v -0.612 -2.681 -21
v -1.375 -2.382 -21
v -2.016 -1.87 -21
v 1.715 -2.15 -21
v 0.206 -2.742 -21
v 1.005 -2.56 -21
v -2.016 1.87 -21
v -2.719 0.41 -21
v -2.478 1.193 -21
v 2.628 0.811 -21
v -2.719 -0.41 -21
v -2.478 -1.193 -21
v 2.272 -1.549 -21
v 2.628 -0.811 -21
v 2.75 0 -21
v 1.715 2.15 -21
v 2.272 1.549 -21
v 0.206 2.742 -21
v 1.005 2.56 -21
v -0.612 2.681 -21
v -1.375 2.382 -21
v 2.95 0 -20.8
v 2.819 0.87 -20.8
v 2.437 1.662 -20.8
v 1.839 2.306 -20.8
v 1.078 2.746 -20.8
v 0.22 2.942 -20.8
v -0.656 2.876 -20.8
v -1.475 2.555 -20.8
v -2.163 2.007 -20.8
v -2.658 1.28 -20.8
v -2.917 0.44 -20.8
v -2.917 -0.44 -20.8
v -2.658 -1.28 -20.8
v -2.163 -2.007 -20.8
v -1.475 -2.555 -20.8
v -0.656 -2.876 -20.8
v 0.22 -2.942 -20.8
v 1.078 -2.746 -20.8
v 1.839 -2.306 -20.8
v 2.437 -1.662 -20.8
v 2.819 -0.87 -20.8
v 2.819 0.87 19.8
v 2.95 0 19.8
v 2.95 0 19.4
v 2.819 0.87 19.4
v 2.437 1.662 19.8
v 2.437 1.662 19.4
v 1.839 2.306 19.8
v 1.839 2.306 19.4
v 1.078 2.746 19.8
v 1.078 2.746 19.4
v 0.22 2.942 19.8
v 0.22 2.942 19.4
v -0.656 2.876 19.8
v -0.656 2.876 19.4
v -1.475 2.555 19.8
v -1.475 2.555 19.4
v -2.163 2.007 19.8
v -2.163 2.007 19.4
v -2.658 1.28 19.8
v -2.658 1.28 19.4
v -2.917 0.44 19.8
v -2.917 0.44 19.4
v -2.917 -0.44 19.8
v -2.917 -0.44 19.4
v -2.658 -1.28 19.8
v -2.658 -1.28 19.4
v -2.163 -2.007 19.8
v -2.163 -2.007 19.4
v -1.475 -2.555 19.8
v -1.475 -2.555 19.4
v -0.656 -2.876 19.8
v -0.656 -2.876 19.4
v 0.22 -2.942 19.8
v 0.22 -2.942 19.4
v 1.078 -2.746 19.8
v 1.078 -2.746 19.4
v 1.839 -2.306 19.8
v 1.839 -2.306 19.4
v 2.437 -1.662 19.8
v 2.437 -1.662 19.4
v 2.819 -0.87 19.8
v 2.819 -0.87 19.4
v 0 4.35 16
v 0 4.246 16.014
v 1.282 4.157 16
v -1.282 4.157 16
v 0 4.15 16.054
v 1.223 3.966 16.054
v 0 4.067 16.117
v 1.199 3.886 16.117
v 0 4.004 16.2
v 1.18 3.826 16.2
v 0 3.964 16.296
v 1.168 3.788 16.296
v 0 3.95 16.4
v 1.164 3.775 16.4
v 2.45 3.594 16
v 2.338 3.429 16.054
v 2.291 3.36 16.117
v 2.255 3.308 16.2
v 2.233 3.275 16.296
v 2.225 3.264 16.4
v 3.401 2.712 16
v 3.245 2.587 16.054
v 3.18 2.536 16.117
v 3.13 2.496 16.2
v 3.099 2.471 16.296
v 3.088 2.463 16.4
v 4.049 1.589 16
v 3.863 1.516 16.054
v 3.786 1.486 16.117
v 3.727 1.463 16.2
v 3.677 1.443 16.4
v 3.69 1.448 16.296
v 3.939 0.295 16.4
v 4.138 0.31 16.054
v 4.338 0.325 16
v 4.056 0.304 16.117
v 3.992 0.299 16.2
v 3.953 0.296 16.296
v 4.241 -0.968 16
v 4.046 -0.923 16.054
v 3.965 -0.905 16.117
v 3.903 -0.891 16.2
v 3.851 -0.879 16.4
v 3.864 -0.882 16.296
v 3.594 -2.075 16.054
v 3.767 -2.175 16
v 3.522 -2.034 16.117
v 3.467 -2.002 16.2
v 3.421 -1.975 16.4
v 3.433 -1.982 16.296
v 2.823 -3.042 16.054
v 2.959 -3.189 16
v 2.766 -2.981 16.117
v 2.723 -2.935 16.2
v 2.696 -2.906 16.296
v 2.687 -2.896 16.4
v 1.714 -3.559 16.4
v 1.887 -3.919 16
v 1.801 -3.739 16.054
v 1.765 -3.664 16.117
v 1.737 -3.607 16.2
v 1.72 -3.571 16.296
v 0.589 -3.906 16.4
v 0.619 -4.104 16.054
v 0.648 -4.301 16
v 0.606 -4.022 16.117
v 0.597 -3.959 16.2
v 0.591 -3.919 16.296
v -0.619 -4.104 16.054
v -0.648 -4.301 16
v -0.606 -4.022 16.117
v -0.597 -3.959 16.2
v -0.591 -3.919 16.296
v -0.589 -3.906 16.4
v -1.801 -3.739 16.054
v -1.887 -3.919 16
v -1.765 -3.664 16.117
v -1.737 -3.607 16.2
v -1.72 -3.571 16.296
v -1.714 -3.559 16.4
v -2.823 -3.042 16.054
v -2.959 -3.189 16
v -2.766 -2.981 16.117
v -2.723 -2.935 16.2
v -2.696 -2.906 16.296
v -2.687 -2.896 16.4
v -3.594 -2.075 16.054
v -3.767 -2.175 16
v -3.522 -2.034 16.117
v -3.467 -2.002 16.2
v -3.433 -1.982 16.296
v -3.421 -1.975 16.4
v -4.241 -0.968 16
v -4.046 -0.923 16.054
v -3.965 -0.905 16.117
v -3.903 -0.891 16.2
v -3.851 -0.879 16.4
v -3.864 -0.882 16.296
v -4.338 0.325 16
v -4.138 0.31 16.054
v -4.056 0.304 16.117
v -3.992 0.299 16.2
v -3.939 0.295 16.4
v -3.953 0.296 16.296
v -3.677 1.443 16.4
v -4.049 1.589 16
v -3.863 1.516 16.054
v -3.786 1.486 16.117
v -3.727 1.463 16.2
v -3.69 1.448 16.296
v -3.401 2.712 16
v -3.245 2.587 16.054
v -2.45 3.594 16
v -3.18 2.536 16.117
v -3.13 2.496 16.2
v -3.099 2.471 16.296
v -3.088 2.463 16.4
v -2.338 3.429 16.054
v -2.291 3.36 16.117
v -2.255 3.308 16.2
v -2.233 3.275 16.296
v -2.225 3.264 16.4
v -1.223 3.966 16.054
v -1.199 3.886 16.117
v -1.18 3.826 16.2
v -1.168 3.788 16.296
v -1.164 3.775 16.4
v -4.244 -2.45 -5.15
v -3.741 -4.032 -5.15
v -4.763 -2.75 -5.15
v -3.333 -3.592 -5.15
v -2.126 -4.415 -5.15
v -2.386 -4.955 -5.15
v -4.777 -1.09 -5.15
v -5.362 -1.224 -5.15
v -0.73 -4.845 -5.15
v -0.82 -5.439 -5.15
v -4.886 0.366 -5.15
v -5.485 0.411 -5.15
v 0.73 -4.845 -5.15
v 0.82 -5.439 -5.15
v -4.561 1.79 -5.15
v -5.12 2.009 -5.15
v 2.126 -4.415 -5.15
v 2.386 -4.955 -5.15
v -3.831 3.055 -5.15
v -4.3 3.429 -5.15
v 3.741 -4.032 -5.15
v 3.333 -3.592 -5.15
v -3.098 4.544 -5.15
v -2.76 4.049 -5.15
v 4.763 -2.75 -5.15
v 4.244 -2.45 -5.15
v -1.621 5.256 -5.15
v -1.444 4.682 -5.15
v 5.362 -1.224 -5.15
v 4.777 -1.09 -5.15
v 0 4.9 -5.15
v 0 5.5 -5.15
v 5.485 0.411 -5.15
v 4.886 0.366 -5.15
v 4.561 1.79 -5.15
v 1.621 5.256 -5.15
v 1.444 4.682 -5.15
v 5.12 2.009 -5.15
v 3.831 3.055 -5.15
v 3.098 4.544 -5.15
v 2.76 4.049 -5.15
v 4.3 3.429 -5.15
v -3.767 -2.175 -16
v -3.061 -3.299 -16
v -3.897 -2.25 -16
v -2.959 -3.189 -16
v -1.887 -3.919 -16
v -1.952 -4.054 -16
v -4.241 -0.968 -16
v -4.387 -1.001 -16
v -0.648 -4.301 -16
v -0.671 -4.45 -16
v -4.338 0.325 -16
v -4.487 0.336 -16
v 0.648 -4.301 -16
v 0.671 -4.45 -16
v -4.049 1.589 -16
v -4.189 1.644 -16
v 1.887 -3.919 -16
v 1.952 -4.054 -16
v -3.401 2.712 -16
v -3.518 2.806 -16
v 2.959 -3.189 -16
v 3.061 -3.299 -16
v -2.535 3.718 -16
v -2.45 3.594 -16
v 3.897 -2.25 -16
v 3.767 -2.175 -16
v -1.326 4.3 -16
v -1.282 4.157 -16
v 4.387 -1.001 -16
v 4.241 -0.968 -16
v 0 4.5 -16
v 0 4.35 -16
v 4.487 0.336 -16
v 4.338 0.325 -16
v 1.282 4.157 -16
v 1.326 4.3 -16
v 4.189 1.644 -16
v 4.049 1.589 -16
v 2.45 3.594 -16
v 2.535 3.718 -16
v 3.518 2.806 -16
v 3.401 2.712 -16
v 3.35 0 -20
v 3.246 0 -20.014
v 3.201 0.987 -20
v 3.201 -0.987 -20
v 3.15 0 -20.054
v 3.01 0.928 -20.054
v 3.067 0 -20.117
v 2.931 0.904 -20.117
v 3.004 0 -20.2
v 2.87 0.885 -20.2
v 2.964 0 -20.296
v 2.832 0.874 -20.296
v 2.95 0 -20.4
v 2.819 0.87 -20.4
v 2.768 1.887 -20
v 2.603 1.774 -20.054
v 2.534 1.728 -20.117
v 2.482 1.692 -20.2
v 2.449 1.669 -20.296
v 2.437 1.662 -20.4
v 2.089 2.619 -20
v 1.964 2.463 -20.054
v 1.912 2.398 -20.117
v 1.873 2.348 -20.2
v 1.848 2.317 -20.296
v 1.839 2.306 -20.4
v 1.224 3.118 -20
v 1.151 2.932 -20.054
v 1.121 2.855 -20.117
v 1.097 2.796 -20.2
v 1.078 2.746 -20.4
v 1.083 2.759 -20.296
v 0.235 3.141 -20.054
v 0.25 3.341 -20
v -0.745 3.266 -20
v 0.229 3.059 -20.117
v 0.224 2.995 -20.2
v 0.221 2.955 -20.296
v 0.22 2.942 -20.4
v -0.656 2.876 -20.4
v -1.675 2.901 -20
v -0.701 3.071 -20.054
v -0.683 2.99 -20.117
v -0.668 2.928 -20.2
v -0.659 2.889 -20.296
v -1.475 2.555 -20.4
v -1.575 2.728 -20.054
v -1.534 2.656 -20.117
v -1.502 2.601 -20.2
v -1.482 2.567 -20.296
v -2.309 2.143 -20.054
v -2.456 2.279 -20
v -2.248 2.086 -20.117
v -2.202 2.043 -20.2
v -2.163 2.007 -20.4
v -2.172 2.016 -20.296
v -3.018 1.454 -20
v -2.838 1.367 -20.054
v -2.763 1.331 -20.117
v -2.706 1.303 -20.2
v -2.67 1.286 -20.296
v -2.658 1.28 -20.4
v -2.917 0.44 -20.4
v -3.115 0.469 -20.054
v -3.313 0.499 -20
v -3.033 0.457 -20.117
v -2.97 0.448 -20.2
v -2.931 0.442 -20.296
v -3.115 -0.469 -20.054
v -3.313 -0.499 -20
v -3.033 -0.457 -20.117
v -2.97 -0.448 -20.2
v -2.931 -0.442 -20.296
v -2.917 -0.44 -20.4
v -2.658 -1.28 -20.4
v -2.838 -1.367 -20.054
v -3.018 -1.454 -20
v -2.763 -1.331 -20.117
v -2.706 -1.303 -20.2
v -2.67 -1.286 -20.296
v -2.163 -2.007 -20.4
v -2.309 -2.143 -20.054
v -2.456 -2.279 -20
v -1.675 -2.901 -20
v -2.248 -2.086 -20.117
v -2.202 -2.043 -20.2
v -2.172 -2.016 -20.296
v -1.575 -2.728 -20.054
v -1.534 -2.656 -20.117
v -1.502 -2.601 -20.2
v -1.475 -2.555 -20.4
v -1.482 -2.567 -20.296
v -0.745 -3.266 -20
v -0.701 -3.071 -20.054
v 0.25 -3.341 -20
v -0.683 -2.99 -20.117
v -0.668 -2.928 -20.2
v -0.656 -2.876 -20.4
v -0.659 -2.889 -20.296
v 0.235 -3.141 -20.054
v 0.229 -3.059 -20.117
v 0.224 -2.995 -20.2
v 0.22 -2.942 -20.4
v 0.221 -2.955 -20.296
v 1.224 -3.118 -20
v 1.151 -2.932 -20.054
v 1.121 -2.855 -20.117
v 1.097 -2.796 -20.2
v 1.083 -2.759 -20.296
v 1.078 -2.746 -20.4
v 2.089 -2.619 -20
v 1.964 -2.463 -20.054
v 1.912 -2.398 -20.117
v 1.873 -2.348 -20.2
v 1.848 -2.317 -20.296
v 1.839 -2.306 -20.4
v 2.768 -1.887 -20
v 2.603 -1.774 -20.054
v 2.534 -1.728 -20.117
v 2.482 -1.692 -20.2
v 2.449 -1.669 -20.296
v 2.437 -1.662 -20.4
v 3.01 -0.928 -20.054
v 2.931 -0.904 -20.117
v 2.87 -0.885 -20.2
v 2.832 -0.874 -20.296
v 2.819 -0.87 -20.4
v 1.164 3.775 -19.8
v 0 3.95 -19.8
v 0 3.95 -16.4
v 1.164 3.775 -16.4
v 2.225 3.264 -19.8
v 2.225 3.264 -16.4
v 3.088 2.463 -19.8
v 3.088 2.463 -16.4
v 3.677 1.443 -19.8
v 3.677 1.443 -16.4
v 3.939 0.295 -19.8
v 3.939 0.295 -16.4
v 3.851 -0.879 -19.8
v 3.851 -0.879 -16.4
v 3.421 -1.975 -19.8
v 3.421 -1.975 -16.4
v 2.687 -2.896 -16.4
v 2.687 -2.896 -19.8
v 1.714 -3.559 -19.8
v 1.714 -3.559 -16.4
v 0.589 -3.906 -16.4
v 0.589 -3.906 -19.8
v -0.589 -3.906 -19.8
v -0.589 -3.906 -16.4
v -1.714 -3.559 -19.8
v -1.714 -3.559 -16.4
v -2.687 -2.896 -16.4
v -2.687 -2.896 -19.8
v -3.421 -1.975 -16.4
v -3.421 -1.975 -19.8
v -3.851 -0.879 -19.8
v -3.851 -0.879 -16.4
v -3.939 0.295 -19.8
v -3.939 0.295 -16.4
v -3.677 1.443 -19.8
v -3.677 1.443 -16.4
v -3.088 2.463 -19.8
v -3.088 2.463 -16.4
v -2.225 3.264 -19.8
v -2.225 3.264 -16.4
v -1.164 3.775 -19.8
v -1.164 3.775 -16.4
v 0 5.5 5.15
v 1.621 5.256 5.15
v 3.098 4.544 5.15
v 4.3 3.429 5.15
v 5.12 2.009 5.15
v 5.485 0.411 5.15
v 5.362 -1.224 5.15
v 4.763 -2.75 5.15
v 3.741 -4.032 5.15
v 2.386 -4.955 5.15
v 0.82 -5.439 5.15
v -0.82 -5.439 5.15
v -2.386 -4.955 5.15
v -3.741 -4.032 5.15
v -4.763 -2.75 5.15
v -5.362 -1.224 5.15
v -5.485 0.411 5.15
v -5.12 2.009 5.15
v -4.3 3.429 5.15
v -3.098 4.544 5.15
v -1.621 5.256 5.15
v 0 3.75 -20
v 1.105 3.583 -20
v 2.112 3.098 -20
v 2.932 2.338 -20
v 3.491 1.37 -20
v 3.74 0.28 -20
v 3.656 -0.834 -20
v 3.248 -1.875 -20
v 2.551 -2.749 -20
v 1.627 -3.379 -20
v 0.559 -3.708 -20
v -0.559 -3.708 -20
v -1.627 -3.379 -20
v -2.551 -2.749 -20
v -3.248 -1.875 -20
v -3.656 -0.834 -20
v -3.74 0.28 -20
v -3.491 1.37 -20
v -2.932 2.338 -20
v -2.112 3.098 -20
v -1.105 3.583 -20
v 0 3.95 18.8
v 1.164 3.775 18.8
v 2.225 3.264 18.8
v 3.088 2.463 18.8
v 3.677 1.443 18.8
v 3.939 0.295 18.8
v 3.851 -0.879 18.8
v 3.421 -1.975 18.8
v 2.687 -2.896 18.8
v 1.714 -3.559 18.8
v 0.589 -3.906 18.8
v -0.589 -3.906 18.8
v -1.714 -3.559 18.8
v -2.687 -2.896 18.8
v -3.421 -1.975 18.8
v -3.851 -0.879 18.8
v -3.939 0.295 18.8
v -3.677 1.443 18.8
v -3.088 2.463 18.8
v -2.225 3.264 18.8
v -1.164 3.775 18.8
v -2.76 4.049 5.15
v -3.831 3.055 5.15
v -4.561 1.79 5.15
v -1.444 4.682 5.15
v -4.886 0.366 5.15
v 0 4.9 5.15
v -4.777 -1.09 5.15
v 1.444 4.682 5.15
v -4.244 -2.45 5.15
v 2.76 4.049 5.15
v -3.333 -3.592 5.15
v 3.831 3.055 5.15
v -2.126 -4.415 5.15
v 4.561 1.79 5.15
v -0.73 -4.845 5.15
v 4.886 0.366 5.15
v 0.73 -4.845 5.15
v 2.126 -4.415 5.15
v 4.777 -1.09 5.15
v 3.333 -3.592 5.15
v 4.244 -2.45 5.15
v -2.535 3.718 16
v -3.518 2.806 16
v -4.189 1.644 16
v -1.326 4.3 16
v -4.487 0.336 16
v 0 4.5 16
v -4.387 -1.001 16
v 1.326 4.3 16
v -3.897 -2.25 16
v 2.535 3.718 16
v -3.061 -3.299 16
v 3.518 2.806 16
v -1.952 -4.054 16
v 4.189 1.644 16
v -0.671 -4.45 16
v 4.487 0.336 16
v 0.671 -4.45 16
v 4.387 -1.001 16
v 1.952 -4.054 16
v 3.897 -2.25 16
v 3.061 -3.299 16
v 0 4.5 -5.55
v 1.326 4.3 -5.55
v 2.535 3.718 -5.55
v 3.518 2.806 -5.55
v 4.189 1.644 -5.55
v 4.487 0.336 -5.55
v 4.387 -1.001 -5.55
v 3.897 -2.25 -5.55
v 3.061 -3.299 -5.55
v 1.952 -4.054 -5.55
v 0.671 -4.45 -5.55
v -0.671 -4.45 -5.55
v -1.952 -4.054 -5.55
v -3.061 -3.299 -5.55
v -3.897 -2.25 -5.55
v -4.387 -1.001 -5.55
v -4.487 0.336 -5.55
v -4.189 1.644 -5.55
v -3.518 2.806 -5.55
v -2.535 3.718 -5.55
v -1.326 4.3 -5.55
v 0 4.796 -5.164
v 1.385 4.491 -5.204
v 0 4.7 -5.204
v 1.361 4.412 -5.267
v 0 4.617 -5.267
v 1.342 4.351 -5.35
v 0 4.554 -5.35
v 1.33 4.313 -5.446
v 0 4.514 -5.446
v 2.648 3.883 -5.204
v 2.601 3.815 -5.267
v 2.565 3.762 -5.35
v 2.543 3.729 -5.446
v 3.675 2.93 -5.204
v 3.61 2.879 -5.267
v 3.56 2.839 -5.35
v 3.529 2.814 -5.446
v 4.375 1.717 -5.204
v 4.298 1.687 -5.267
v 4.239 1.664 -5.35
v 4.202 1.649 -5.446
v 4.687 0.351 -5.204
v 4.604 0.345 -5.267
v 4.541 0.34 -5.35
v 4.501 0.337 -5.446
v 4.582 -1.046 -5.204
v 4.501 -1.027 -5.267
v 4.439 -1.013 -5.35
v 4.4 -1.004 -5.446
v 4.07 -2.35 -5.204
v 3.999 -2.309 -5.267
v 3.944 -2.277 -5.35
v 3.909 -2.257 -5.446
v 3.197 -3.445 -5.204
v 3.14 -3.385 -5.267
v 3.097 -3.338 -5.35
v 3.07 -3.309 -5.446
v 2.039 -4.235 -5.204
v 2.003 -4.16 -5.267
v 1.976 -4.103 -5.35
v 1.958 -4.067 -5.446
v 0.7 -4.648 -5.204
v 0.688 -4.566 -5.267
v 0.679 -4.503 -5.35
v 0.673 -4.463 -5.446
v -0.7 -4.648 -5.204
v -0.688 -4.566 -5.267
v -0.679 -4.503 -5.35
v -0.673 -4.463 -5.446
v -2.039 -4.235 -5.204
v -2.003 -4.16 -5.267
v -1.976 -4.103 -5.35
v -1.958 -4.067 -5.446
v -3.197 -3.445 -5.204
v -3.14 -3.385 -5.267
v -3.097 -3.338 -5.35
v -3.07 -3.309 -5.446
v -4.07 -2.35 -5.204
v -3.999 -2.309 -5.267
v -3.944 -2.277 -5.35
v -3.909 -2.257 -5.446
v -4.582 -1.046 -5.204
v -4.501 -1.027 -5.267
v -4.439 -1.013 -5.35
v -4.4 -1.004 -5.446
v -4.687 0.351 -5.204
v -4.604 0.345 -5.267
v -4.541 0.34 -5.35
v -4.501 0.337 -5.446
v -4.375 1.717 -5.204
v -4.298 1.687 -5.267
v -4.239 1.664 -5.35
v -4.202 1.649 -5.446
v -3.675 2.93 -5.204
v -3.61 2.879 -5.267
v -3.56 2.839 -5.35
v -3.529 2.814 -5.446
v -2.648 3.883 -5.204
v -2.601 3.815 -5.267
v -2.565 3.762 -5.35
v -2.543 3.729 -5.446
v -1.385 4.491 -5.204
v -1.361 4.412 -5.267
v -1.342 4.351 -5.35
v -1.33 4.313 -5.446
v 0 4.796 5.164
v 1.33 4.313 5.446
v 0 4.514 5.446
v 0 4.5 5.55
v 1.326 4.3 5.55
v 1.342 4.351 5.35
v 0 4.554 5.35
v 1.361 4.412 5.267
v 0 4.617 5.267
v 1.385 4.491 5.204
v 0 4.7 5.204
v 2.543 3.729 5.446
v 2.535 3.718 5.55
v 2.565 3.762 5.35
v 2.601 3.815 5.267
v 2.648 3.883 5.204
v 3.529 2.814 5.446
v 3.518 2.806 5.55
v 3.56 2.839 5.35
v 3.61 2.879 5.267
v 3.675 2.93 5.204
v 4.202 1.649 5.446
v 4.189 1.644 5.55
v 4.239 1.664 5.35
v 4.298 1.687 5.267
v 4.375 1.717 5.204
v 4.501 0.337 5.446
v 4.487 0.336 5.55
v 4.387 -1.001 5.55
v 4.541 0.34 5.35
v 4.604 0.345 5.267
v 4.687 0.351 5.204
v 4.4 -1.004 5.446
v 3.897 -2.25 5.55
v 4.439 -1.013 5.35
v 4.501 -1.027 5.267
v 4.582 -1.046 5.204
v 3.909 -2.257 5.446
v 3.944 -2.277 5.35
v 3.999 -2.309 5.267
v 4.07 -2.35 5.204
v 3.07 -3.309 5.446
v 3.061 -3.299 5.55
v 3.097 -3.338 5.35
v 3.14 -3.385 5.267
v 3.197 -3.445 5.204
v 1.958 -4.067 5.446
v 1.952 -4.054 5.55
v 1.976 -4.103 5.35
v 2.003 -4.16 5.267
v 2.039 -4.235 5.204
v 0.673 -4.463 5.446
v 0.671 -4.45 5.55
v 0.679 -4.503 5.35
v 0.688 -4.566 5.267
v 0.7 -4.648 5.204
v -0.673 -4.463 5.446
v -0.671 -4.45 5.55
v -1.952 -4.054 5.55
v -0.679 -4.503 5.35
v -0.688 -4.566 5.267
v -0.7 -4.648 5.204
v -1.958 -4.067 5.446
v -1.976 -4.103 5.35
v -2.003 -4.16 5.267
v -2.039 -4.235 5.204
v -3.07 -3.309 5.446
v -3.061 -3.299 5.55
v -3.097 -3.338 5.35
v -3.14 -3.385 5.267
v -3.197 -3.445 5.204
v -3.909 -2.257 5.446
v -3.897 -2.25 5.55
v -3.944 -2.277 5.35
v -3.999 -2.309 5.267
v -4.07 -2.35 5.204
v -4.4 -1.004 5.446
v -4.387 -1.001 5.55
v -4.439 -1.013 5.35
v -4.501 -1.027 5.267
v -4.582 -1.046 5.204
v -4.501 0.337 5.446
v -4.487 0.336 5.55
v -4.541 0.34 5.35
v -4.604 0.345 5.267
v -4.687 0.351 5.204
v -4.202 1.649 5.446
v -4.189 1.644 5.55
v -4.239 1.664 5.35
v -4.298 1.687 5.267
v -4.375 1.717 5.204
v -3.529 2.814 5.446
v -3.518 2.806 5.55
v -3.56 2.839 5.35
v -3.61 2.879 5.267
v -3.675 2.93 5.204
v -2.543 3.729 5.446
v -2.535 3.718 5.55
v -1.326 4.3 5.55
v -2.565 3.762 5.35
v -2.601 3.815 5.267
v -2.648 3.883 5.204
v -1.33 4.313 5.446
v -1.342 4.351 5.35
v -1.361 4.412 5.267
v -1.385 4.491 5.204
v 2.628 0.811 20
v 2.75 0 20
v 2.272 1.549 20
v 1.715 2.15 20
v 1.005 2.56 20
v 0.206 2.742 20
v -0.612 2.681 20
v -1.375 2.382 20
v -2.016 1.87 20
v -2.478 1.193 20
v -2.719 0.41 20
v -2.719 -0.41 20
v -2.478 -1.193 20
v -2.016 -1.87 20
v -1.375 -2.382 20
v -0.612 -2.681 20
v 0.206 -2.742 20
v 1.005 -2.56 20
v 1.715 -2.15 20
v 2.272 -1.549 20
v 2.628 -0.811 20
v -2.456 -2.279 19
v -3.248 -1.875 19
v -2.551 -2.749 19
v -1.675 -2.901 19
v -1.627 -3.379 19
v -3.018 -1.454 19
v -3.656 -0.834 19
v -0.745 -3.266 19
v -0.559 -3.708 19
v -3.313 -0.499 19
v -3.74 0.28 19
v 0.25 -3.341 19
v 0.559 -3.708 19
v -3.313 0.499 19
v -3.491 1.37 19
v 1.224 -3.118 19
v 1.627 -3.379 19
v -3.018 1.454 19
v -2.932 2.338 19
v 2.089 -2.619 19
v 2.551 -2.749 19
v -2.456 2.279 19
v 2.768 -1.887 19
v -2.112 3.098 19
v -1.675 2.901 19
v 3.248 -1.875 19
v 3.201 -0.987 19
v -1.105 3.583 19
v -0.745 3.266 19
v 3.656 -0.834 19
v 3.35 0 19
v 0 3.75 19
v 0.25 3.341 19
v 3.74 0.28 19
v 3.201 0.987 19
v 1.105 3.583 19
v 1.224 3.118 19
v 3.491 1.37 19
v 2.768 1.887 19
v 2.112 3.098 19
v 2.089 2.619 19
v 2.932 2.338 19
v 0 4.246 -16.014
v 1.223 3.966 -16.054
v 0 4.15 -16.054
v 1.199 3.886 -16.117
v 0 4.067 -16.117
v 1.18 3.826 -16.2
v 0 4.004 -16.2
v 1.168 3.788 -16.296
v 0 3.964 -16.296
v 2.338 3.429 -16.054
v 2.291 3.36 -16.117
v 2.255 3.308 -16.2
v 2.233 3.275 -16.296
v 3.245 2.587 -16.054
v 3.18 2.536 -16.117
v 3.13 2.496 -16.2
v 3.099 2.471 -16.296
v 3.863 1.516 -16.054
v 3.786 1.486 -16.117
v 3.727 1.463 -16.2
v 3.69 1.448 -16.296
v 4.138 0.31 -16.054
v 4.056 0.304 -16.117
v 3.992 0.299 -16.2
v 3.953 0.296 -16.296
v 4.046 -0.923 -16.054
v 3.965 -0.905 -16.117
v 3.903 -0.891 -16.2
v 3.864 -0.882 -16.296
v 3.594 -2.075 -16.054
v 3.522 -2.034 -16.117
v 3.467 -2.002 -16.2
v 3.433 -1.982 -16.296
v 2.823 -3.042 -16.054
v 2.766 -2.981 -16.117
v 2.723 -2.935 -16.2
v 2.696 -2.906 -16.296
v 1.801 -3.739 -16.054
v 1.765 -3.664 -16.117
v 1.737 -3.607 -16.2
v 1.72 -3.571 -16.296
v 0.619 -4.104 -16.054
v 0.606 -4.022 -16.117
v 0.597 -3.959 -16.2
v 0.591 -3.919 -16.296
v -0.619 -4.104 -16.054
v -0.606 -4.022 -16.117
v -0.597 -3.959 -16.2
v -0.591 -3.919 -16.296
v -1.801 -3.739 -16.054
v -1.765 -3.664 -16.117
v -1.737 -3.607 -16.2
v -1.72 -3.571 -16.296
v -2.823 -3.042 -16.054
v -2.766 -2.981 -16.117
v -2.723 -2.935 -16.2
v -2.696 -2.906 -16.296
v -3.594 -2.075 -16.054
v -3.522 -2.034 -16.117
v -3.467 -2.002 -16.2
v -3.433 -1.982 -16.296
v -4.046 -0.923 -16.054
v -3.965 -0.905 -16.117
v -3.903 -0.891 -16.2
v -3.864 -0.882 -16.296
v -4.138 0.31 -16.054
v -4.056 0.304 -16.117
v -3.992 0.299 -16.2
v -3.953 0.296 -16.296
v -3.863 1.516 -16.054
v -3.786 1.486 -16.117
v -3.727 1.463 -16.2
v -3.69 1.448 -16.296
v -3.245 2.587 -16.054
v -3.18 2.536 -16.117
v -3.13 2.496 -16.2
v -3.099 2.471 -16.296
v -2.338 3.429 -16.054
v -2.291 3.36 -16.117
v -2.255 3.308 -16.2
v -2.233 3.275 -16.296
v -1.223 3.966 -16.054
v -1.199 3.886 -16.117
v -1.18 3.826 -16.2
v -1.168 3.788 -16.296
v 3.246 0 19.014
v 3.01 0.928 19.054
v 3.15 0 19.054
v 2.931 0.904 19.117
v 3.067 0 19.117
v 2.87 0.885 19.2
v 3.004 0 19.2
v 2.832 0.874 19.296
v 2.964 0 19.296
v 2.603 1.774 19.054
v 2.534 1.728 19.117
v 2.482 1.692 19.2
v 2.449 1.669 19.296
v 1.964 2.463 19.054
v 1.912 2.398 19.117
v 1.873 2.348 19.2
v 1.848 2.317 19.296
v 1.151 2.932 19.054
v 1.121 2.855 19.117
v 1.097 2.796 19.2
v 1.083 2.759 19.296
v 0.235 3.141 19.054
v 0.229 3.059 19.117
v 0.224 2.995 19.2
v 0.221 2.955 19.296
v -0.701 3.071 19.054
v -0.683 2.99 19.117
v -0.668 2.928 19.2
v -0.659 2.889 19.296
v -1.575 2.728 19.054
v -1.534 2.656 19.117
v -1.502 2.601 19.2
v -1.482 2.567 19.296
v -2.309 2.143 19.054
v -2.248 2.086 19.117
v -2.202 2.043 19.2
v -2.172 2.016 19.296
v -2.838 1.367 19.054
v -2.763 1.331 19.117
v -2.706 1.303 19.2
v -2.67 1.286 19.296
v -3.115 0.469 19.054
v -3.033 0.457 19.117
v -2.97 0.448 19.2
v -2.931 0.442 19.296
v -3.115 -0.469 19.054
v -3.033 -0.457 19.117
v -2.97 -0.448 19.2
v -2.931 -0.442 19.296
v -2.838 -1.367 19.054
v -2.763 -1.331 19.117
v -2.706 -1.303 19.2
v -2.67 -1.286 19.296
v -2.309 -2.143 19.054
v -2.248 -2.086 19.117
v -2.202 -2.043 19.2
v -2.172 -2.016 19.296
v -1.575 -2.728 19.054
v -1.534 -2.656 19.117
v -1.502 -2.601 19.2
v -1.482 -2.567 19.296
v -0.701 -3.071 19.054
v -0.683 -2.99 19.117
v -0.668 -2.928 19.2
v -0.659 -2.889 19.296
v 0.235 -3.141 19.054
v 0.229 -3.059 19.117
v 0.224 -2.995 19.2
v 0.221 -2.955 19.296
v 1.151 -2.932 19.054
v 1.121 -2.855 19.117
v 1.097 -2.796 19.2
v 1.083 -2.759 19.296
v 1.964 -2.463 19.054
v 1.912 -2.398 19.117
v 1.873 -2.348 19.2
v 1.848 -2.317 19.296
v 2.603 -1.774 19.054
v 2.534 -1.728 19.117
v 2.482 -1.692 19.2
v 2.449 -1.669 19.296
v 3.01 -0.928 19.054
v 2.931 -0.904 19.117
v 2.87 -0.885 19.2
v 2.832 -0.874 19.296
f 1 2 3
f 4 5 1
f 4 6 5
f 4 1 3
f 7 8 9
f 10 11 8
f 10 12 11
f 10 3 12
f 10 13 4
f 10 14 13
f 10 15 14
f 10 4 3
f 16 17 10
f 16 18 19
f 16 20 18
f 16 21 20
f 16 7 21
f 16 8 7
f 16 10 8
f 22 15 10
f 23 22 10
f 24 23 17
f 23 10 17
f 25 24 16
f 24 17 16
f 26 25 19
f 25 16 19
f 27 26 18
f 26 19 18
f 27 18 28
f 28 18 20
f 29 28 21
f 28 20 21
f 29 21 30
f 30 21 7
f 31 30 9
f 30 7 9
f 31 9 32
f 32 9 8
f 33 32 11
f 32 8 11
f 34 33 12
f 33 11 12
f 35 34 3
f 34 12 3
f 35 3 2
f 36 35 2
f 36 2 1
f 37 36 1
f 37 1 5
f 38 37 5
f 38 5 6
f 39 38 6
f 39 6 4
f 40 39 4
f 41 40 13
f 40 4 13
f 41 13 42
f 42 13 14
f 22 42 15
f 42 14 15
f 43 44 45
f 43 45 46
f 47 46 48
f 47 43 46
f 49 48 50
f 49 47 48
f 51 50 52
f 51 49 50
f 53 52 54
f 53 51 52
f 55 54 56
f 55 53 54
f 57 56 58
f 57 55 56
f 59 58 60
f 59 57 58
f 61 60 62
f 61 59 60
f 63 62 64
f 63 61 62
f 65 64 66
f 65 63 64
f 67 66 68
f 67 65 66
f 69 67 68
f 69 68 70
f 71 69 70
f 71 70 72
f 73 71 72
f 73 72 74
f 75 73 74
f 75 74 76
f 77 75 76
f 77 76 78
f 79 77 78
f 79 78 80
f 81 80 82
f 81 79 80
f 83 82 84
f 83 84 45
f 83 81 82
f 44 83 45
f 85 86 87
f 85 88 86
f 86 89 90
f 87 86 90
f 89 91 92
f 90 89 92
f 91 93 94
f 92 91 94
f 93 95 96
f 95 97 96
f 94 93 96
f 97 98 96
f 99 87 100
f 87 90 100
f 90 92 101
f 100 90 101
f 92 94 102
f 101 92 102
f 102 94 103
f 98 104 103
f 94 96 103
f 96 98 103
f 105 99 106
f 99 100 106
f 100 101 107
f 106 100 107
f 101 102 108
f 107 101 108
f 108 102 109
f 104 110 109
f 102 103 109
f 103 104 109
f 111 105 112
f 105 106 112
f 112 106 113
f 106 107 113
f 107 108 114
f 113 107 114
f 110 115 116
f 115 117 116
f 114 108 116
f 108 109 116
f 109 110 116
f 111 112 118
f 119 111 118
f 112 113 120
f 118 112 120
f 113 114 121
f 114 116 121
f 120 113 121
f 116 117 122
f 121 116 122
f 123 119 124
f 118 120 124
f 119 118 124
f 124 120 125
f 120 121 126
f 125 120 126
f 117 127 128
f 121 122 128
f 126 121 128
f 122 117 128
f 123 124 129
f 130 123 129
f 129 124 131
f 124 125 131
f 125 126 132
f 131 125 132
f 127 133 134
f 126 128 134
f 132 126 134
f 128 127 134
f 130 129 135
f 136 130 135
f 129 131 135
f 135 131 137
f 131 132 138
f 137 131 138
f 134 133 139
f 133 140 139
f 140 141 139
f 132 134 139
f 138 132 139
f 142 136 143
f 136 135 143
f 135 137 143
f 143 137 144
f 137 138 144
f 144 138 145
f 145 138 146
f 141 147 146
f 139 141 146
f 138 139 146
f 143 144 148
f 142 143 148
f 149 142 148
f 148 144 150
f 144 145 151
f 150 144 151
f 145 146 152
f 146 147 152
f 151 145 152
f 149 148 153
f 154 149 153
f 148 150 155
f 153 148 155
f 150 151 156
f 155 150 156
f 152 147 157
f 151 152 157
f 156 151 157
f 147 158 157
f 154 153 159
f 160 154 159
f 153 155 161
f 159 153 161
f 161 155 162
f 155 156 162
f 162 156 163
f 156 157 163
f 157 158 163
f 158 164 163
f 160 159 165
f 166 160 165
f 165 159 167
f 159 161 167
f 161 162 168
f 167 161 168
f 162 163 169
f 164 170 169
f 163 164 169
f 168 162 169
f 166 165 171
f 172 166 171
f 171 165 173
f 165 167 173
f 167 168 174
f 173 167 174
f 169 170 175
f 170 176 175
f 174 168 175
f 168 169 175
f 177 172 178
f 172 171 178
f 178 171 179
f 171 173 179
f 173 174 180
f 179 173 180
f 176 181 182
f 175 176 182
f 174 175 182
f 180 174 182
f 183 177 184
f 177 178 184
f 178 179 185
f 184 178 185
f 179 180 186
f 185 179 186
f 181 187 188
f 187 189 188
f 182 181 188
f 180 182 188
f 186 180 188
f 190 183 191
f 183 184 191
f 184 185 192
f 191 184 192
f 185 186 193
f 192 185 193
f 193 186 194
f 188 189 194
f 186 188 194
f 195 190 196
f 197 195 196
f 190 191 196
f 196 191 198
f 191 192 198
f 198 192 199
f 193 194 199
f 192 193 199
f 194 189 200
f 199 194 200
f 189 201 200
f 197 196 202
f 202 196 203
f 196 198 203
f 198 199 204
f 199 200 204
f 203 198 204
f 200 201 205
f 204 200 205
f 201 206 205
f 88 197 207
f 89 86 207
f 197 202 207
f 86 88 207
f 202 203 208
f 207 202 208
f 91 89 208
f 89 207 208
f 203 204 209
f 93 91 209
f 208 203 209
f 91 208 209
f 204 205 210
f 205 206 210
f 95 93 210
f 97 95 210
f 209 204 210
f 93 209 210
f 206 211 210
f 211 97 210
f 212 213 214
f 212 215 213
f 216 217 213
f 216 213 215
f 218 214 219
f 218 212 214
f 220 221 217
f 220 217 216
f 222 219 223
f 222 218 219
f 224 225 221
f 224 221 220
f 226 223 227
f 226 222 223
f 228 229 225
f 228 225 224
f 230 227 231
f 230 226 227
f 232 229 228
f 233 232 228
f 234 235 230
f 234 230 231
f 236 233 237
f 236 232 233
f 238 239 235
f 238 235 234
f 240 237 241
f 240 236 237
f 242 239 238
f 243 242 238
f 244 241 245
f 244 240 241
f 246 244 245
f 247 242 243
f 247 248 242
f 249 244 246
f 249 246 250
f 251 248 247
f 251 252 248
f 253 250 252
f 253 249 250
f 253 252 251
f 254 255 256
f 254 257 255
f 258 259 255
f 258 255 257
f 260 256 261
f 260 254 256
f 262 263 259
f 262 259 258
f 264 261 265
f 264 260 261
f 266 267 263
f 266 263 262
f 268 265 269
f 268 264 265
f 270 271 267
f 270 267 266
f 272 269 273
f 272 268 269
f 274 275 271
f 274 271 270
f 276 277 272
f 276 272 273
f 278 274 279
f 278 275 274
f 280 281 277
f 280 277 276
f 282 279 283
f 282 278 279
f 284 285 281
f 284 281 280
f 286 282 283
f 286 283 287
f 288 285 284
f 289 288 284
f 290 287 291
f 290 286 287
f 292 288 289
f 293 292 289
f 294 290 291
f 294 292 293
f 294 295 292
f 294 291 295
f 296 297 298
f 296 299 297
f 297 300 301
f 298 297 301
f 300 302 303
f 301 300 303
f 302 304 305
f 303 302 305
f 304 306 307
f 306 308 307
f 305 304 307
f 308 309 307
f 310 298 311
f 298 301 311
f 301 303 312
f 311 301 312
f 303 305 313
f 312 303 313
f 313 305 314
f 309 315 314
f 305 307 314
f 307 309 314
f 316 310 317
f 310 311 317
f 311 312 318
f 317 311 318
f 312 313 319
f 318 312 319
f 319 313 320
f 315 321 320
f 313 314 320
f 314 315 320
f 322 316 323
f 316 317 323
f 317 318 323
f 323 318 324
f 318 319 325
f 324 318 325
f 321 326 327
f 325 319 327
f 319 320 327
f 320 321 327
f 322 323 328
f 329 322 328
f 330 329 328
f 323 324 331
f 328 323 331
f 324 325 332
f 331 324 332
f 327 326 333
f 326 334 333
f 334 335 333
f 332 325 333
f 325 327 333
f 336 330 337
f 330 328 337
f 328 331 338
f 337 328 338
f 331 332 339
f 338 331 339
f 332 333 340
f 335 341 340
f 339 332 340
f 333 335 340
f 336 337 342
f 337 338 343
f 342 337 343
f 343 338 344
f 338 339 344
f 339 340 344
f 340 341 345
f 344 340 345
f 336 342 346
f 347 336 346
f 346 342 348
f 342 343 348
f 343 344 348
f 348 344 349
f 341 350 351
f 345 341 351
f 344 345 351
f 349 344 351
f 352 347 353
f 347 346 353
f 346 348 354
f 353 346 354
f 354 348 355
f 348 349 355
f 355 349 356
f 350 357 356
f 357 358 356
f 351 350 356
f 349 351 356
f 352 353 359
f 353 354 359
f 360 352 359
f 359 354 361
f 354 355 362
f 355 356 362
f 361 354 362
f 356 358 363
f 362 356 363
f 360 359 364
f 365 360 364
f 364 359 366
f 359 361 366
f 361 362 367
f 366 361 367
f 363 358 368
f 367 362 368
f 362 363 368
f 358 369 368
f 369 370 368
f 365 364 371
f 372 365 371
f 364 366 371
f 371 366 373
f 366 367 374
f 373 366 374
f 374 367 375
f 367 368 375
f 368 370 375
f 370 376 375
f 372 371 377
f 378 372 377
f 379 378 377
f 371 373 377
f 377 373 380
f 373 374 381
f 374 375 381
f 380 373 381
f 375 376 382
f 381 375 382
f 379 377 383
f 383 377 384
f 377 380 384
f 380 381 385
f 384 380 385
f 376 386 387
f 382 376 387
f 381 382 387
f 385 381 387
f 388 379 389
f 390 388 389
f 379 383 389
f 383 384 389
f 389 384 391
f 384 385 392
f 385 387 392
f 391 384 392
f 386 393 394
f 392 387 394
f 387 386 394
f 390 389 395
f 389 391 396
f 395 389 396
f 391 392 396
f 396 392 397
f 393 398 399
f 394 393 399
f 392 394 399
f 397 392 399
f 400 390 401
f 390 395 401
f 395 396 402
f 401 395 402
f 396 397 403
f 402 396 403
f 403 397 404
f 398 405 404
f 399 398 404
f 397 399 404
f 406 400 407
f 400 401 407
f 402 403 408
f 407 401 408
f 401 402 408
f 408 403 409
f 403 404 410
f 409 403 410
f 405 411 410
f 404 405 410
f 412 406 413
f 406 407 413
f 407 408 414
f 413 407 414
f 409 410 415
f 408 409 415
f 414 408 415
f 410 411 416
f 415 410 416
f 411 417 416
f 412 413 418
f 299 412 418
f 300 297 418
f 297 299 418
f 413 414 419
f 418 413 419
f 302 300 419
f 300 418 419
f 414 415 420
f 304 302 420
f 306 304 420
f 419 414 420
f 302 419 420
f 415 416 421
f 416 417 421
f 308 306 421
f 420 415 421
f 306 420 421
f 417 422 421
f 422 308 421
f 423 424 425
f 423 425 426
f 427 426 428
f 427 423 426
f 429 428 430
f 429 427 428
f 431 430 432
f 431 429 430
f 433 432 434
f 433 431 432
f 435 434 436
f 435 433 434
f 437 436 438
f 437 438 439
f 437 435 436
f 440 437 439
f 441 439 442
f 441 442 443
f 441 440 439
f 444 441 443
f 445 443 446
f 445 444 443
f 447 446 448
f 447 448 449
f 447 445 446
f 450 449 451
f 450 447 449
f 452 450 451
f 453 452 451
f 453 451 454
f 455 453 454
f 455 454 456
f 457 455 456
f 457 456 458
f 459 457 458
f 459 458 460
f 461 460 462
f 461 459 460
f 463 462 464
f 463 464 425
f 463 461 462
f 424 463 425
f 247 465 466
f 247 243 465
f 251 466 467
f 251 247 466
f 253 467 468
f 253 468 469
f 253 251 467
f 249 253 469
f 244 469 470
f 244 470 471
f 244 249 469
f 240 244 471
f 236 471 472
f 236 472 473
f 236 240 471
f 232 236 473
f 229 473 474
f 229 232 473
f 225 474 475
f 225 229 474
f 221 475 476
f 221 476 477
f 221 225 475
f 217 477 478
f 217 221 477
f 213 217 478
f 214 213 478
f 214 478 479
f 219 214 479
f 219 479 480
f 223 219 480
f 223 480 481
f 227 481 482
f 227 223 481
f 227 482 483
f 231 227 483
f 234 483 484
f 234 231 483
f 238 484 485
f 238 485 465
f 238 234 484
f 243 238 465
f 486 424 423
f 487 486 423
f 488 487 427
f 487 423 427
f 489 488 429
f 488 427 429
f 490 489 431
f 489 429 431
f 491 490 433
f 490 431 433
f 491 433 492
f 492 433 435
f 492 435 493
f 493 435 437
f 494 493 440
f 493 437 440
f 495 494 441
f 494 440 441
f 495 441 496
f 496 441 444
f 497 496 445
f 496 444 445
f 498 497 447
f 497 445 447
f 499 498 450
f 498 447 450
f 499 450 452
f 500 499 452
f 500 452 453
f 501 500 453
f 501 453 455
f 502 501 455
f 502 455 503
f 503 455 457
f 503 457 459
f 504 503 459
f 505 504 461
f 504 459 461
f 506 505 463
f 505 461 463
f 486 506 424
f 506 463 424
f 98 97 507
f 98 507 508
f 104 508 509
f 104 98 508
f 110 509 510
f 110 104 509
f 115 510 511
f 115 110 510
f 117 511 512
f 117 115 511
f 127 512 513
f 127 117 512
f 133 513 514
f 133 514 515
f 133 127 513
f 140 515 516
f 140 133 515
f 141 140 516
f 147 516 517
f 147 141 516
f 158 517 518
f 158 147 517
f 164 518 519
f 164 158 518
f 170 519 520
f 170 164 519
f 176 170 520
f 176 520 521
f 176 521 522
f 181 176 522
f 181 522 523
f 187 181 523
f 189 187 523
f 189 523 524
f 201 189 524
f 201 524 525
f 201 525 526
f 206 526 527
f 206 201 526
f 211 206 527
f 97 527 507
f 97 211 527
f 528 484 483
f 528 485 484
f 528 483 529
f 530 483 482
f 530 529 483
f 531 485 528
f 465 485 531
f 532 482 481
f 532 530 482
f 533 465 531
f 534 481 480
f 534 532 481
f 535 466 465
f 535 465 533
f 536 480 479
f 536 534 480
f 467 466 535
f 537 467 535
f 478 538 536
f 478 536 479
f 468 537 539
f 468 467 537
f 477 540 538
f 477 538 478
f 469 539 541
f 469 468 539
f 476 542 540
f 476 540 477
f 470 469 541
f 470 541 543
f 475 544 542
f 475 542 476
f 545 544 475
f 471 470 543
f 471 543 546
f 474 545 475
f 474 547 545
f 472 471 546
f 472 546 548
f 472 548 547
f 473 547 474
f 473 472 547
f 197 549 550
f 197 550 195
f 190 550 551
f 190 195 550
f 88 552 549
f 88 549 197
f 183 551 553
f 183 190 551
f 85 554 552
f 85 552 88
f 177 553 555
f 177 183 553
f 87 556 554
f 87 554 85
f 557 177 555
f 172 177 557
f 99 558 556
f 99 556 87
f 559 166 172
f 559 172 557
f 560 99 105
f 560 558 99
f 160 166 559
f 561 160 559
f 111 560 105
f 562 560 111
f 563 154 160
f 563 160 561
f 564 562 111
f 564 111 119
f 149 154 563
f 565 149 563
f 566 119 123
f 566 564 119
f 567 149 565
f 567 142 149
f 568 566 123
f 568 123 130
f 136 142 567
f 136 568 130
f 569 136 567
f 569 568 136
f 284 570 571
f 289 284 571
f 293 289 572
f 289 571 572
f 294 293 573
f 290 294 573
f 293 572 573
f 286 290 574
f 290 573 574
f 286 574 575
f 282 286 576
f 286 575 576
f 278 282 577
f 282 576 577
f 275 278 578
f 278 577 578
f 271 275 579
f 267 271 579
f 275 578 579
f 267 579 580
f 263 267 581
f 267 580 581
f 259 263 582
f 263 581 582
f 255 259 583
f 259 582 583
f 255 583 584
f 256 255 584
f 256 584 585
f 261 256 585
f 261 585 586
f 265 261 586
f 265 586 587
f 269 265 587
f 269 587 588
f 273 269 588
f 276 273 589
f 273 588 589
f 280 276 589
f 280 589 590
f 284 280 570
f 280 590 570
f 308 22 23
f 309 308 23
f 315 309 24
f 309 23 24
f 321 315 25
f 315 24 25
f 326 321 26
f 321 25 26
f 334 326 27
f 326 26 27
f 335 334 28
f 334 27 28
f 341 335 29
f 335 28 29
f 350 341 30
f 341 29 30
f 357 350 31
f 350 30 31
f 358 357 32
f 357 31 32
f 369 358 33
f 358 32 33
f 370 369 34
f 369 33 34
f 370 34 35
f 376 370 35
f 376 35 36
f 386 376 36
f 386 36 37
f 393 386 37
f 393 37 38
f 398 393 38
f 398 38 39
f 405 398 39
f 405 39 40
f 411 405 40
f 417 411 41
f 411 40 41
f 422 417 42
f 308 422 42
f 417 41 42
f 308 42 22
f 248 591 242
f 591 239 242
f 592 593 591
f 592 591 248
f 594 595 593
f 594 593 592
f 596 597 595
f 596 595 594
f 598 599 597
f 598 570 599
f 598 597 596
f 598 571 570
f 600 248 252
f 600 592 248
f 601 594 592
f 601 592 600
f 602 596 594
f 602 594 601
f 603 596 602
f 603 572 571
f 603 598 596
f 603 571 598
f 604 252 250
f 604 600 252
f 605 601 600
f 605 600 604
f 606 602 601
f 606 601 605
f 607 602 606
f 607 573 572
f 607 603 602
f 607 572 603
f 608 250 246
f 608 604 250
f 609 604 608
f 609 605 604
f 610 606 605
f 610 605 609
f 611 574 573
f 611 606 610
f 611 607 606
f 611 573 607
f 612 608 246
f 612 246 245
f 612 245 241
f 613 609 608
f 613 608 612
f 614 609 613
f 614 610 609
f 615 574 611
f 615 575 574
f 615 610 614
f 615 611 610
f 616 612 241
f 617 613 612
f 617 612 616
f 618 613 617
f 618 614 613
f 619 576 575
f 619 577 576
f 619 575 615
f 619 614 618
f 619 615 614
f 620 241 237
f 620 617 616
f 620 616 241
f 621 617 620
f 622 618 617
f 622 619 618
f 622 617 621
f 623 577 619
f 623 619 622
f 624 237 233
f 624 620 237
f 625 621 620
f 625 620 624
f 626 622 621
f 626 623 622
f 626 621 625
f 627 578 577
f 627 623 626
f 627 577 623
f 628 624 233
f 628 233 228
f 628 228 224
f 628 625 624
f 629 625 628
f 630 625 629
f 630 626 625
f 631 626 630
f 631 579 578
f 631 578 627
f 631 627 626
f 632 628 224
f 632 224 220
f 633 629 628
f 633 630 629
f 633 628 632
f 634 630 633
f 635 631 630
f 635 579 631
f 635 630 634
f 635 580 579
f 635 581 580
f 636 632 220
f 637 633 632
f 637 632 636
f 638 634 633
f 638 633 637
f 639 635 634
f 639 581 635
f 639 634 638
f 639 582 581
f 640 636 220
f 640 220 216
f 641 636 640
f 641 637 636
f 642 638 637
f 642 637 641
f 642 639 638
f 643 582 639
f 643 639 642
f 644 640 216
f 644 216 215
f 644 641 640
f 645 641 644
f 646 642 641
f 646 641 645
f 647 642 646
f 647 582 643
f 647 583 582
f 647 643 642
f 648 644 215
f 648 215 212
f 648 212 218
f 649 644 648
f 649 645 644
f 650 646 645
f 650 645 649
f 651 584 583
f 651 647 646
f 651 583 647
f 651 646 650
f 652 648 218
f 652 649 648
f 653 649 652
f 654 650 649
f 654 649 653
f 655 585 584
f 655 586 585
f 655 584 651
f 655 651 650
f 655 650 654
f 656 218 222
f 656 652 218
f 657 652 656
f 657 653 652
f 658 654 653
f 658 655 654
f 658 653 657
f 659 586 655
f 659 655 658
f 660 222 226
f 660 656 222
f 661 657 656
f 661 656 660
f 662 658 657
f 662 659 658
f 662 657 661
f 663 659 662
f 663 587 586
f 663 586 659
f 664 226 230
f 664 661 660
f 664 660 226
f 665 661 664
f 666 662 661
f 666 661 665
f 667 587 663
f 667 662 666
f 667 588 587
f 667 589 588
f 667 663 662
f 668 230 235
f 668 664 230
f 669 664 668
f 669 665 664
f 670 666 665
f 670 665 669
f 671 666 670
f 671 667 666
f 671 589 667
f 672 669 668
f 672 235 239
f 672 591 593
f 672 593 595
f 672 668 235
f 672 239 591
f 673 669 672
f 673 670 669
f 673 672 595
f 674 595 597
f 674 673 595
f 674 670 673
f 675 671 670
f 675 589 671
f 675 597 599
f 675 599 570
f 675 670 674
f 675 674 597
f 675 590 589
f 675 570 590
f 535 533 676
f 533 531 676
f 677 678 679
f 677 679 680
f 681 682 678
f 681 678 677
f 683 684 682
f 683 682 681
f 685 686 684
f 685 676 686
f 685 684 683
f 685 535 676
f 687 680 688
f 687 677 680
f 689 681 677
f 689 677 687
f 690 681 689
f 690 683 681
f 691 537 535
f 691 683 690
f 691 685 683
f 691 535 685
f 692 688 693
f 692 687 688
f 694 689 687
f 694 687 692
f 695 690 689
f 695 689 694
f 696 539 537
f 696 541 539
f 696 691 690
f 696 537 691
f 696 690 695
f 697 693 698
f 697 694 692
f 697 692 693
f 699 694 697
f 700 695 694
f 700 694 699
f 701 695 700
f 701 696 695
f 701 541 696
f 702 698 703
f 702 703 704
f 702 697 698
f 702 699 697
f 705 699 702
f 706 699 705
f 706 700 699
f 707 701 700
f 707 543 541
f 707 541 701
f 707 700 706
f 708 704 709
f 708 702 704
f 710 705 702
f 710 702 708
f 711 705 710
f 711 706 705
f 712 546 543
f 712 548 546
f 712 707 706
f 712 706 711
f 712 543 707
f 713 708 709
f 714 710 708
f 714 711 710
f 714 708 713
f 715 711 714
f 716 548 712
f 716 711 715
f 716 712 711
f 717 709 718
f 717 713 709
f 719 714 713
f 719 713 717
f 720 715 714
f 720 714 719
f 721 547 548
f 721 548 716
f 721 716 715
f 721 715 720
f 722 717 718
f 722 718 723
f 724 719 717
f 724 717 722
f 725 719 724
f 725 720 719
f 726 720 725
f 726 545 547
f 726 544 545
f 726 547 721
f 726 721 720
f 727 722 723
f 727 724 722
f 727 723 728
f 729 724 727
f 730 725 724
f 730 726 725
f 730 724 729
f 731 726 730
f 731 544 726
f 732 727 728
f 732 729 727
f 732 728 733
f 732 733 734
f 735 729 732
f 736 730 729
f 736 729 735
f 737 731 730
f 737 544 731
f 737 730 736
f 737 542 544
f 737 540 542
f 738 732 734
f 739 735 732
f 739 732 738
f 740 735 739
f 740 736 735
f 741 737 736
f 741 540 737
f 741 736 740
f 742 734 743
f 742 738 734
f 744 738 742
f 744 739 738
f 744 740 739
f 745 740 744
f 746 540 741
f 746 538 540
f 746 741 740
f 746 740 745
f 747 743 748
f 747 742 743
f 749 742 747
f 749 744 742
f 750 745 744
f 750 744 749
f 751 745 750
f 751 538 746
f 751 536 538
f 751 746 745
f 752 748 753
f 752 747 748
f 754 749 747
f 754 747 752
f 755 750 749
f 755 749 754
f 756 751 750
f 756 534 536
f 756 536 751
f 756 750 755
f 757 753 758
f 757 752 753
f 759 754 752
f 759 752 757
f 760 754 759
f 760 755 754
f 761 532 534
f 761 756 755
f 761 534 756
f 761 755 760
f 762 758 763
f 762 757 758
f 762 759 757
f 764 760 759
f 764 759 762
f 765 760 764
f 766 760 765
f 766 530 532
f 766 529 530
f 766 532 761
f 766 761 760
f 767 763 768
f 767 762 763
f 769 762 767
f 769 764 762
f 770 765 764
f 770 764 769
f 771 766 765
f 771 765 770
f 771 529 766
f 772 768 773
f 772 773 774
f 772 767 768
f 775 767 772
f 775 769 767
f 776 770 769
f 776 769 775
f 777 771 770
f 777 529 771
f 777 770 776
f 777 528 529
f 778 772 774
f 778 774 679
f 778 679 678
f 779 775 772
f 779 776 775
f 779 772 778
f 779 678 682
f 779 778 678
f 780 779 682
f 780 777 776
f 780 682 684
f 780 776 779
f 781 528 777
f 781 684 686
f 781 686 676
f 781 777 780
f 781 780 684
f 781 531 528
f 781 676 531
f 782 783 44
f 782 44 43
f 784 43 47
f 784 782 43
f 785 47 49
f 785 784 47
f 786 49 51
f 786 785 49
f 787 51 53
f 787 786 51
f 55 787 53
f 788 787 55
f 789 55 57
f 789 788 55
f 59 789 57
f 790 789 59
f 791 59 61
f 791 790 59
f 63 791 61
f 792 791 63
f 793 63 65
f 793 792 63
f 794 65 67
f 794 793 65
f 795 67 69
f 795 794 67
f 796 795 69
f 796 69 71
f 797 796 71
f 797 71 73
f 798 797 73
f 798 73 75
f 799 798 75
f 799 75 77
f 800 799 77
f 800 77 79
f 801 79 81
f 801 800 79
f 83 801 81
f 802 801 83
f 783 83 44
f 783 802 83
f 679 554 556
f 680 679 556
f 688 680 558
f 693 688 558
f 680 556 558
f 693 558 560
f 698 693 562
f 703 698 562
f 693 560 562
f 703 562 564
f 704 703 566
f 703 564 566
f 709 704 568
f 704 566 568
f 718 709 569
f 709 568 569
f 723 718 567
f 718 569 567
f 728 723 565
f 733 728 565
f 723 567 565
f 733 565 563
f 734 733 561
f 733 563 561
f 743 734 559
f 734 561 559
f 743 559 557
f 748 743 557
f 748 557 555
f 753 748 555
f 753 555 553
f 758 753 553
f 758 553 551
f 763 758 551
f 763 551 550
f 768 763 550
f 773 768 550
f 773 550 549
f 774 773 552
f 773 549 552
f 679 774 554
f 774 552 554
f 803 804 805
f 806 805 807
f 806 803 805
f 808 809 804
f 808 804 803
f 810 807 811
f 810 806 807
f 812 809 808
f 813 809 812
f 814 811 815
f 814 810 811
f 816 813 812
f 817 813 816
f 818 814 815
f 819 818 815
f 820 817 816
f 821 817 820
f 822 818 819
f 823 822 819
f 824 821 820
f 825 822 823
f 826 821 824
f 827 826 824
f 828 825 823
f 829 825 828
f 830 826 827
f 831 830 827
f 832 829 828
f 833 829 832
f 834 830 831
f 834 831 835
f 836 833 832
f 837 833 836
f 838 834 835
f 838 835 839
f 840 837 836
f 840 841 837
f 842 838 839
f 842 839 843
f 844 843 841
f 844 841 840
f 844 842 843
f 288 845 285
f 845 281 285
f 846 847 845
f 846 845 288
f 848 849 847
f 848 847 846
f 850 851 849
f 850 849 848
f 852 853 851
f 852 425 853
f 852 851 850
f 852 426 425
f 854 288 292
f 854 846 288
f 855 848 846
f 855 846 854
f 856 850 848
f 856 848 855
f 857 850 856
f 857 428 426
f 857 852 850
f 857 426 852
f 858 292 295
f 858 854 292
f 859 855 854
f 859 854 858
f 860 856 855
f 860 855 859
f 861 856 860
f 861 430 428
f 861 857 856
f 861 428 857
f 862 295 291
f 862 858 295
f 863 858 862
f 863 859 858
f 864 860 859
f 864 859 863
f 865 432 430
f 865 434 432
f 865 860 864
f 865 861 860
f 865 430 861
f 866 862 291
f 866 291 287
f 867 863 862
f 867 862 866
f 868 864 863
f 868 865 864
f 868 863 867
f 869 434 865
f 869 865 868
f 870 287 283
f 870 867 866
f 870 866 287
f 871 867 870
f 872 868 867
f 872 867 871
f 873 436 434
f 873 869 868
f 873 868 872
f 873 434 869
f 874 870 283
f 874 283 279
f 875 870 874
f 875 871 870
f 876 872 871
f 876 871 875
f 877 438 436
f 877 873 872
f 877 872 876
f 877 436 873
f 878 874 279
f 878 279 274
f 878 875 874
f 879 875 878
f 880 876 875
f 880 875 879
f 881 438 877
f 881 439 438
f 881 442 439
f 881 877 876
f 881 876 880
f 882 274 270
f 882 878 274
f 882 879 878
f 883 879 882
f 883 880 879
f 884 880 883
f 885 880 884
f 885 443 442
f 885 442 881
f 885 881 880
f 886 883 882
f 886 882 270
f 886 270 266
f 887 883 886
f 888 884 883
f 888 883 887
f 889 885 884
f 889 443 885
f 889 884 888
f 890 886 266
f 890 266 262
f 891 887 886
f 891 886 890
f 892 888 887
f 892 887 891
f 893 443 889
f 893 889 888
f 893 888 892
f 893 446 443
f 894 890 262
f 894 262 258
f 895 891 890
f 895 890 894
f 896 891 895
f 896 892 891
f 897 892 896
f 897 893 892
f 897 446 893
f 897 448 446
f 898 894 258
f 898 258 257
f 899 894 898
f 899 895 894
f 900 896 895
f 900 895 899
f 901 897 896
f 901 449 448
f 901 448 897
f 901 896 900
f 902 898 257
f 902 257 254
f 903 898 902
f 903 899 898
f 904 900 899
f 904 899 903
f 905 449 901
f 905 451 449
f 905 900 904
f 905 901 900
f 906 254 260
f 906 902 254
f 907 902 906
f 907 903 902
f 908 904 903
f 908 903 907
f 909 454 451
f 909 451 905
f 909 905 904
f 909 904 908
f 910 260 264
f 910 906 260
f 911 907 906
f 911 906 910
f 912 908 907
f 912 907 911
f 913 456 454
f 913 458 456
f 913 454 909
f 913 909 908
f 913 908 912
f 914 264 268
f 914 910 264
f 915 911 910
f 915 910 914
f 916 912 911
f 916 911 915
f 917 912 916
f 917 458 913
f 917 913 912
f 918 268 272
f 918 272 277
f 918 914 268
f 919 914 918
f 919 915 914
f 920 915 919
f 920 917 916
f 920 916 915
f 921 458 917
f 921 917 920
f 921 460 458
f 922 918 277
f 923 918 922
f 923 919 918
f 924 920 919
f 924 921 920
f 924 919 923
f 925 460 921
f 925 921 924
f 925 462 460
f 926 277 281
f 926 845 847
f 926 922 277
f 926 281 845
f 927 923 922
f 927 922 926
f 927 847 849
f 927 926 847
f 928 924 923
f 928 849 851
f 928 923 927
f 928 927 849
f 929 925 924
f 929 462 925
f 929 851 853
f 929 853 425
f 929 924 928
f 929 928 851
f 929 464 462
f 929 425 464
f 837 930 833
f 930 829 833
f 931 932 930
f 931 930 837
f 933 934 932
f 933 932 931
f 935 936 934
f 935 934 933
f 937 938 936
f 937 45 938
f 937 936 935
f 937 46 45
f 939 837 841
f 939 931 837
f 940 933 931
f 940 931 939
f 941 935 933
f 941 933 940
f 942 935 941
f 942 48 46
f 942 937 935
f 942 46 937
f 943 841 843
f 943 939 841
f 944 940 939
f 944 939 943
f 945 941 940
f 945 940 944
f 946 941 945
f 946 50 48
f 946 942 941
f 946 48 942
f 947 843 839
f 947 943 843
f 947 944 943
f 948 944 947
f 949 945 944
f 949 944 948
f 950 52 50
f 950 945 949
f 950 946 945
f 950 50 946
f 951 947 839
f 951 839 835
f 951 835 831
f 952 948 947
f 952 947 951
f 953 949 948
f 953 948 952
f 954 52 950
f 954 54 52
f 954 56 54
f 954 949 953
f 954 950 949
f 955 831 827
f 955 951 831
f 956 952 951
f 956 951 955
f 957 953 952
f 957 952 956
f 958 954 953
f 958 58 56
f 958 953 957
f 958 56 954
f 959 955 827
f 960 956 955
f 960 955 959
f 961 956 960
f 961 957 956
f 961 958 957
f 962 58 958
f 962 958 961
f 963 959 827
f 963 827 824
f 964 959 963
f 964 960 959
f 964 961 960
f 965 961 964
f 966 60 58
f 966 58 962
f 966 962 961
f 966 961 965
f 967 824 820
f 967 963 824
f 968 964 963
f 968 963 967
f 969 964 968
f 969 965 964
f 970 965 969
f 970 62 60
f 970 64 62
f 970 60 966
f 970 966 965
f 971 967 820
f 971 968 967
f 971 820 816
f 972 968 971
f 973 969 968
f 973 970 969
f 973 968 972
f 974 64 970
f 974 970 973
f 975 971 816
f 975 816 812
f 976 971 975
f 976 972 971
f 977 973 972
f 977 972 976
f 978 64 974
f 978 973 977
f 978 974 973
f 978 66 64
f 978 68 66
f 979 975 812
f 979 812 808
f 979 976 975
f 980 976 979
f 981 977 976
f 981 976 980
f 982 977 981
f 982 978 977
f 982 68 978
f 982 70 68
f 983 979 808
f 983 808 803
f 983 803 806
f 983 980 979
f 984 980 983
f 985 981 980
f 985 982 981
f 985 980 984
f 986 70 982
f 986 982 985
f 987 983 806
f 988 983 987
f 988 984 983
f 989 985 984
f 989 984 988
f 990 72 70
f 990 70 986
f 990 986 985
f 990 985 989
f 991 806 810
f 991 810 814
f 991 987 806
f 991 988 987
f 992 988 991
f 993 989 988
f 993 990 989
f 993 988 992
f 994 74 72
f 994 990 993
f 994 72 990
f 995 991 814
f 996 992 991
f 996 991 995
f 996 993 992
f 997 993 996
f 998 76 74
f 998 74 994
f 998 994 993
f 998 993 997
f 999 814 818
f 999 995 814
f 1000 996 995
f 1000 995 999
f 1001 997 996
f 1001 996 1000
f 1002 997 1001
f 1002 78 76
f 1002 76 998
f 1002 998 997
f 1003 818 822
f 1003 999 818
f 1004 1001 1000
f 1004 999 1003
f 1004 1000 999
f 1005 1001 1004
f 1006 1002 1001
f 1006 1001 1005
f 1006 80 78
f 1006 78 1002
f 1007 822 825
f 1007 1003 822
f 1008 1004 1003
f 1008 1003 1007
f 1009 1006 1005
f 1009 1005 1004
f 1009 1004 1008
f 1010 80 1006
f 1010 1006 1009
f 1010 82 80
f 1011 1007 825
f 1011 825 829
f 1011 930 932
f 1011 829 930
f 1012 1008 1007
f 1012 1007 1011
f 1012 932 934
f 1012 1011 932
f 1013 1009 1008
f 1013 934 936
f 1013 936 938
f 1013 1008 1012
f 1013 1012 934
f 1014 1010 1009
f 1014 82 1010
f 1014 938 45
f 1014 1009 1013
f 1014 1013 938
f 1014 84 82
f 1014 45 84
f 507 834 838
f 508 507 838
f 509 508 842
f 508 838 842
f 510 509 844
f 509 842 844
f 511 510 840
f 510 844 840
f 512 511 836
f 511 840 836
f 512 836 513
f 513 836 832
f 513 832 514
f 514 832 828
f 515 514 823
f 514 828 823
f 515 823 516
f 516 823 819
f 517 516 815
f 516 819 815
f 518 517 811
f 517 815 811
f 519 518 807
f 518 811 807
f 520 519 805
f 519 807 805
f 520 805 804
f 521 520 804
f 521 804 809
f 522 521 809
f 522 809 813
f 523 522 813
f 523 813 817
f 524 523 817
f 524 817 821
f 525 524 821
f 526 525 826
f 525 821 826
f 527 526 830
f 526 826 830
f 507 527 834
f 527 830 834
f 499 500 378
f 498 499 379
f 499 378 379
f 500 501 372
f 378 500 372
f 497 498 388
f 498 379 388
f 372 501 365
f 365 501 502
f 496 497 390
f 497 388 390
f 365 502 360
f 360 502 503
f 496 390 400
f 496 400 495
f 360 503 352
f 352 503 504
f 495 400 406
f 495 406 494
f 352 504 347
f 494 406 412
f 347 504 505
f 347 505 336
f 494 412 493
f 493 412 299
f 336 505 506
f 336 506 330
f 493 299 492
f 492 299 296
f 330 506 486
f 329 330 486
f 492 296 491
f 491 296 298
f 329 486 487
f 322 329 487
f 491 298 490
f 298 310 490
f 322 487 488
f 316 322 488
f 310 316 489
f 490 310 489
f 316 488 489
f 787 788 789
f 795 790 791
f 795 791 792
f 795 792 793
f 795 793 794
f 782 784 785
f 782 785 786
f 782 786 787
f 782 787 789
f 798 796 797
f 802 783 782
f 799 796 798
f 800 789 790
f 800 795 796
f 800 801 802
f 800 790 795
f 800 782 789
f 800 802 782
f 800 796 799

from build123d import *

# Parameters (mm, degrees)
BEARINGBOREFILLET_R = 0.4
FILLET2_R           = 0.4
CUT_EXTRUDE1_START  = 20
SKETCH2_OUTSIDE_W   = 21.77
SKETCH2_OUTSIDE_H   = 21.77
SKETCH2_OUTSIDE_R   = 2.95
CUT_EXTRUDE1_DEPTH  = 1
CUT_EXTRUDE2_START  = -21
SKETCH2_2_OUTSIDE_W = 21.77
SKETCH2_2_OUTSIDE_H = 21.77
SKETCH2_2_OUTSIDE_R = 2.95
CUT_EXTRUDE2_DEPTH  = 1
FILLET3_R           = 0.4
CHAMFER1_SIZE       = 0.2


with BuildPart() as part:
    # Sketch1 → Revolve1 (revolve)
    with BuildSketch(Plane(origin=(0, 0, 0), x_dir=(0, 0, -1), z_dir=(1, 0, 0))):
        Polygon((5.15, 5.5), (5.15, 4.5), (15, 4.5), (16, 4.5), (16, 3.95), (21, 3.95), (21, 0), (-20, 0), (-20, 3.95), (-16, 3.95), (-16, 4.5), (-15, 4.5), (-5.15, 4.5), (-5.15, 5.5), align=None)
    revolve(axis=Axis((0, 0, 20), (0, 0, -1)))

    # bearingBoreFillet
    bearingborefillet_edges = [part.edges().sort_by_distance(p)[0] for p in [
        (0, -4.5, -5.15),
        (0, -4.5, 5.15),
    ]]
    fillet(bearingborefillet_edges, radius=BEARINGBOREFILLET_R)

    # Fillet2
    fillet2_edges = [part.edges().sort_by_distance(p)[0] for p in [
        (0, -3.95, 16),
        (0, -3.95, -16),
    ]]
    fillet(fillet2_edges, radius=FILLET2_R)

    # Sketch2 outside → Cut-Extrude1 (cut)
    with BuildSketch(Plane.XY.offset(CUT_EXTRUDE1_START)):
        Rectangle(SKETCH2_OUTSIDE_W, SKETCH2_OUTSIDE_H)
        Circle(SKETCH2_OUTSIDE_R, mode=Mode.SUBTRACT)
    extrude(amount=-CUT_EXTRUDE1_DEPTH, mode=Mode.SUBTRACT)

    # Sketch2<2> outside → Cut-Extrude2 (cut)
    with BuildSketch(Plane.XY.offset(CUT_EXTRUDE2_START)):
        Rectangle(SKETCH2_2_OUTSIDE_W, SKETCH2_2_OUTSIDE_H)
        Circle(SKETCH2_2_OUTSIDE_R, mode=Mode.SUBTRACT)
    extrude(amount=CUT_EXTRUDE2_DEPTH, mode=Mode.SUBTRACT)

    # Fillet3
    fillet3_edges = [part.edges().sort_by_distance(p)[0] for p in [
        (-2.95, 0, 19),
        (-2.95, 0, -20),
    ]]
    fillet(fillet3_edges, radius=FILLET3_R)

    # Chamfer1
    chamfer1_edges = [part.edges().sort_by_distance(p)[0] for p in [
        (0, -3.95, 19),
        (-2.95, 0, 20),
        (-2.95, 0, -21),
        (0, -3.95, -20),
    ]]
    chamfer(chamfer1_edges, length=CHAMFER1_SIZE)


solid = part.part
